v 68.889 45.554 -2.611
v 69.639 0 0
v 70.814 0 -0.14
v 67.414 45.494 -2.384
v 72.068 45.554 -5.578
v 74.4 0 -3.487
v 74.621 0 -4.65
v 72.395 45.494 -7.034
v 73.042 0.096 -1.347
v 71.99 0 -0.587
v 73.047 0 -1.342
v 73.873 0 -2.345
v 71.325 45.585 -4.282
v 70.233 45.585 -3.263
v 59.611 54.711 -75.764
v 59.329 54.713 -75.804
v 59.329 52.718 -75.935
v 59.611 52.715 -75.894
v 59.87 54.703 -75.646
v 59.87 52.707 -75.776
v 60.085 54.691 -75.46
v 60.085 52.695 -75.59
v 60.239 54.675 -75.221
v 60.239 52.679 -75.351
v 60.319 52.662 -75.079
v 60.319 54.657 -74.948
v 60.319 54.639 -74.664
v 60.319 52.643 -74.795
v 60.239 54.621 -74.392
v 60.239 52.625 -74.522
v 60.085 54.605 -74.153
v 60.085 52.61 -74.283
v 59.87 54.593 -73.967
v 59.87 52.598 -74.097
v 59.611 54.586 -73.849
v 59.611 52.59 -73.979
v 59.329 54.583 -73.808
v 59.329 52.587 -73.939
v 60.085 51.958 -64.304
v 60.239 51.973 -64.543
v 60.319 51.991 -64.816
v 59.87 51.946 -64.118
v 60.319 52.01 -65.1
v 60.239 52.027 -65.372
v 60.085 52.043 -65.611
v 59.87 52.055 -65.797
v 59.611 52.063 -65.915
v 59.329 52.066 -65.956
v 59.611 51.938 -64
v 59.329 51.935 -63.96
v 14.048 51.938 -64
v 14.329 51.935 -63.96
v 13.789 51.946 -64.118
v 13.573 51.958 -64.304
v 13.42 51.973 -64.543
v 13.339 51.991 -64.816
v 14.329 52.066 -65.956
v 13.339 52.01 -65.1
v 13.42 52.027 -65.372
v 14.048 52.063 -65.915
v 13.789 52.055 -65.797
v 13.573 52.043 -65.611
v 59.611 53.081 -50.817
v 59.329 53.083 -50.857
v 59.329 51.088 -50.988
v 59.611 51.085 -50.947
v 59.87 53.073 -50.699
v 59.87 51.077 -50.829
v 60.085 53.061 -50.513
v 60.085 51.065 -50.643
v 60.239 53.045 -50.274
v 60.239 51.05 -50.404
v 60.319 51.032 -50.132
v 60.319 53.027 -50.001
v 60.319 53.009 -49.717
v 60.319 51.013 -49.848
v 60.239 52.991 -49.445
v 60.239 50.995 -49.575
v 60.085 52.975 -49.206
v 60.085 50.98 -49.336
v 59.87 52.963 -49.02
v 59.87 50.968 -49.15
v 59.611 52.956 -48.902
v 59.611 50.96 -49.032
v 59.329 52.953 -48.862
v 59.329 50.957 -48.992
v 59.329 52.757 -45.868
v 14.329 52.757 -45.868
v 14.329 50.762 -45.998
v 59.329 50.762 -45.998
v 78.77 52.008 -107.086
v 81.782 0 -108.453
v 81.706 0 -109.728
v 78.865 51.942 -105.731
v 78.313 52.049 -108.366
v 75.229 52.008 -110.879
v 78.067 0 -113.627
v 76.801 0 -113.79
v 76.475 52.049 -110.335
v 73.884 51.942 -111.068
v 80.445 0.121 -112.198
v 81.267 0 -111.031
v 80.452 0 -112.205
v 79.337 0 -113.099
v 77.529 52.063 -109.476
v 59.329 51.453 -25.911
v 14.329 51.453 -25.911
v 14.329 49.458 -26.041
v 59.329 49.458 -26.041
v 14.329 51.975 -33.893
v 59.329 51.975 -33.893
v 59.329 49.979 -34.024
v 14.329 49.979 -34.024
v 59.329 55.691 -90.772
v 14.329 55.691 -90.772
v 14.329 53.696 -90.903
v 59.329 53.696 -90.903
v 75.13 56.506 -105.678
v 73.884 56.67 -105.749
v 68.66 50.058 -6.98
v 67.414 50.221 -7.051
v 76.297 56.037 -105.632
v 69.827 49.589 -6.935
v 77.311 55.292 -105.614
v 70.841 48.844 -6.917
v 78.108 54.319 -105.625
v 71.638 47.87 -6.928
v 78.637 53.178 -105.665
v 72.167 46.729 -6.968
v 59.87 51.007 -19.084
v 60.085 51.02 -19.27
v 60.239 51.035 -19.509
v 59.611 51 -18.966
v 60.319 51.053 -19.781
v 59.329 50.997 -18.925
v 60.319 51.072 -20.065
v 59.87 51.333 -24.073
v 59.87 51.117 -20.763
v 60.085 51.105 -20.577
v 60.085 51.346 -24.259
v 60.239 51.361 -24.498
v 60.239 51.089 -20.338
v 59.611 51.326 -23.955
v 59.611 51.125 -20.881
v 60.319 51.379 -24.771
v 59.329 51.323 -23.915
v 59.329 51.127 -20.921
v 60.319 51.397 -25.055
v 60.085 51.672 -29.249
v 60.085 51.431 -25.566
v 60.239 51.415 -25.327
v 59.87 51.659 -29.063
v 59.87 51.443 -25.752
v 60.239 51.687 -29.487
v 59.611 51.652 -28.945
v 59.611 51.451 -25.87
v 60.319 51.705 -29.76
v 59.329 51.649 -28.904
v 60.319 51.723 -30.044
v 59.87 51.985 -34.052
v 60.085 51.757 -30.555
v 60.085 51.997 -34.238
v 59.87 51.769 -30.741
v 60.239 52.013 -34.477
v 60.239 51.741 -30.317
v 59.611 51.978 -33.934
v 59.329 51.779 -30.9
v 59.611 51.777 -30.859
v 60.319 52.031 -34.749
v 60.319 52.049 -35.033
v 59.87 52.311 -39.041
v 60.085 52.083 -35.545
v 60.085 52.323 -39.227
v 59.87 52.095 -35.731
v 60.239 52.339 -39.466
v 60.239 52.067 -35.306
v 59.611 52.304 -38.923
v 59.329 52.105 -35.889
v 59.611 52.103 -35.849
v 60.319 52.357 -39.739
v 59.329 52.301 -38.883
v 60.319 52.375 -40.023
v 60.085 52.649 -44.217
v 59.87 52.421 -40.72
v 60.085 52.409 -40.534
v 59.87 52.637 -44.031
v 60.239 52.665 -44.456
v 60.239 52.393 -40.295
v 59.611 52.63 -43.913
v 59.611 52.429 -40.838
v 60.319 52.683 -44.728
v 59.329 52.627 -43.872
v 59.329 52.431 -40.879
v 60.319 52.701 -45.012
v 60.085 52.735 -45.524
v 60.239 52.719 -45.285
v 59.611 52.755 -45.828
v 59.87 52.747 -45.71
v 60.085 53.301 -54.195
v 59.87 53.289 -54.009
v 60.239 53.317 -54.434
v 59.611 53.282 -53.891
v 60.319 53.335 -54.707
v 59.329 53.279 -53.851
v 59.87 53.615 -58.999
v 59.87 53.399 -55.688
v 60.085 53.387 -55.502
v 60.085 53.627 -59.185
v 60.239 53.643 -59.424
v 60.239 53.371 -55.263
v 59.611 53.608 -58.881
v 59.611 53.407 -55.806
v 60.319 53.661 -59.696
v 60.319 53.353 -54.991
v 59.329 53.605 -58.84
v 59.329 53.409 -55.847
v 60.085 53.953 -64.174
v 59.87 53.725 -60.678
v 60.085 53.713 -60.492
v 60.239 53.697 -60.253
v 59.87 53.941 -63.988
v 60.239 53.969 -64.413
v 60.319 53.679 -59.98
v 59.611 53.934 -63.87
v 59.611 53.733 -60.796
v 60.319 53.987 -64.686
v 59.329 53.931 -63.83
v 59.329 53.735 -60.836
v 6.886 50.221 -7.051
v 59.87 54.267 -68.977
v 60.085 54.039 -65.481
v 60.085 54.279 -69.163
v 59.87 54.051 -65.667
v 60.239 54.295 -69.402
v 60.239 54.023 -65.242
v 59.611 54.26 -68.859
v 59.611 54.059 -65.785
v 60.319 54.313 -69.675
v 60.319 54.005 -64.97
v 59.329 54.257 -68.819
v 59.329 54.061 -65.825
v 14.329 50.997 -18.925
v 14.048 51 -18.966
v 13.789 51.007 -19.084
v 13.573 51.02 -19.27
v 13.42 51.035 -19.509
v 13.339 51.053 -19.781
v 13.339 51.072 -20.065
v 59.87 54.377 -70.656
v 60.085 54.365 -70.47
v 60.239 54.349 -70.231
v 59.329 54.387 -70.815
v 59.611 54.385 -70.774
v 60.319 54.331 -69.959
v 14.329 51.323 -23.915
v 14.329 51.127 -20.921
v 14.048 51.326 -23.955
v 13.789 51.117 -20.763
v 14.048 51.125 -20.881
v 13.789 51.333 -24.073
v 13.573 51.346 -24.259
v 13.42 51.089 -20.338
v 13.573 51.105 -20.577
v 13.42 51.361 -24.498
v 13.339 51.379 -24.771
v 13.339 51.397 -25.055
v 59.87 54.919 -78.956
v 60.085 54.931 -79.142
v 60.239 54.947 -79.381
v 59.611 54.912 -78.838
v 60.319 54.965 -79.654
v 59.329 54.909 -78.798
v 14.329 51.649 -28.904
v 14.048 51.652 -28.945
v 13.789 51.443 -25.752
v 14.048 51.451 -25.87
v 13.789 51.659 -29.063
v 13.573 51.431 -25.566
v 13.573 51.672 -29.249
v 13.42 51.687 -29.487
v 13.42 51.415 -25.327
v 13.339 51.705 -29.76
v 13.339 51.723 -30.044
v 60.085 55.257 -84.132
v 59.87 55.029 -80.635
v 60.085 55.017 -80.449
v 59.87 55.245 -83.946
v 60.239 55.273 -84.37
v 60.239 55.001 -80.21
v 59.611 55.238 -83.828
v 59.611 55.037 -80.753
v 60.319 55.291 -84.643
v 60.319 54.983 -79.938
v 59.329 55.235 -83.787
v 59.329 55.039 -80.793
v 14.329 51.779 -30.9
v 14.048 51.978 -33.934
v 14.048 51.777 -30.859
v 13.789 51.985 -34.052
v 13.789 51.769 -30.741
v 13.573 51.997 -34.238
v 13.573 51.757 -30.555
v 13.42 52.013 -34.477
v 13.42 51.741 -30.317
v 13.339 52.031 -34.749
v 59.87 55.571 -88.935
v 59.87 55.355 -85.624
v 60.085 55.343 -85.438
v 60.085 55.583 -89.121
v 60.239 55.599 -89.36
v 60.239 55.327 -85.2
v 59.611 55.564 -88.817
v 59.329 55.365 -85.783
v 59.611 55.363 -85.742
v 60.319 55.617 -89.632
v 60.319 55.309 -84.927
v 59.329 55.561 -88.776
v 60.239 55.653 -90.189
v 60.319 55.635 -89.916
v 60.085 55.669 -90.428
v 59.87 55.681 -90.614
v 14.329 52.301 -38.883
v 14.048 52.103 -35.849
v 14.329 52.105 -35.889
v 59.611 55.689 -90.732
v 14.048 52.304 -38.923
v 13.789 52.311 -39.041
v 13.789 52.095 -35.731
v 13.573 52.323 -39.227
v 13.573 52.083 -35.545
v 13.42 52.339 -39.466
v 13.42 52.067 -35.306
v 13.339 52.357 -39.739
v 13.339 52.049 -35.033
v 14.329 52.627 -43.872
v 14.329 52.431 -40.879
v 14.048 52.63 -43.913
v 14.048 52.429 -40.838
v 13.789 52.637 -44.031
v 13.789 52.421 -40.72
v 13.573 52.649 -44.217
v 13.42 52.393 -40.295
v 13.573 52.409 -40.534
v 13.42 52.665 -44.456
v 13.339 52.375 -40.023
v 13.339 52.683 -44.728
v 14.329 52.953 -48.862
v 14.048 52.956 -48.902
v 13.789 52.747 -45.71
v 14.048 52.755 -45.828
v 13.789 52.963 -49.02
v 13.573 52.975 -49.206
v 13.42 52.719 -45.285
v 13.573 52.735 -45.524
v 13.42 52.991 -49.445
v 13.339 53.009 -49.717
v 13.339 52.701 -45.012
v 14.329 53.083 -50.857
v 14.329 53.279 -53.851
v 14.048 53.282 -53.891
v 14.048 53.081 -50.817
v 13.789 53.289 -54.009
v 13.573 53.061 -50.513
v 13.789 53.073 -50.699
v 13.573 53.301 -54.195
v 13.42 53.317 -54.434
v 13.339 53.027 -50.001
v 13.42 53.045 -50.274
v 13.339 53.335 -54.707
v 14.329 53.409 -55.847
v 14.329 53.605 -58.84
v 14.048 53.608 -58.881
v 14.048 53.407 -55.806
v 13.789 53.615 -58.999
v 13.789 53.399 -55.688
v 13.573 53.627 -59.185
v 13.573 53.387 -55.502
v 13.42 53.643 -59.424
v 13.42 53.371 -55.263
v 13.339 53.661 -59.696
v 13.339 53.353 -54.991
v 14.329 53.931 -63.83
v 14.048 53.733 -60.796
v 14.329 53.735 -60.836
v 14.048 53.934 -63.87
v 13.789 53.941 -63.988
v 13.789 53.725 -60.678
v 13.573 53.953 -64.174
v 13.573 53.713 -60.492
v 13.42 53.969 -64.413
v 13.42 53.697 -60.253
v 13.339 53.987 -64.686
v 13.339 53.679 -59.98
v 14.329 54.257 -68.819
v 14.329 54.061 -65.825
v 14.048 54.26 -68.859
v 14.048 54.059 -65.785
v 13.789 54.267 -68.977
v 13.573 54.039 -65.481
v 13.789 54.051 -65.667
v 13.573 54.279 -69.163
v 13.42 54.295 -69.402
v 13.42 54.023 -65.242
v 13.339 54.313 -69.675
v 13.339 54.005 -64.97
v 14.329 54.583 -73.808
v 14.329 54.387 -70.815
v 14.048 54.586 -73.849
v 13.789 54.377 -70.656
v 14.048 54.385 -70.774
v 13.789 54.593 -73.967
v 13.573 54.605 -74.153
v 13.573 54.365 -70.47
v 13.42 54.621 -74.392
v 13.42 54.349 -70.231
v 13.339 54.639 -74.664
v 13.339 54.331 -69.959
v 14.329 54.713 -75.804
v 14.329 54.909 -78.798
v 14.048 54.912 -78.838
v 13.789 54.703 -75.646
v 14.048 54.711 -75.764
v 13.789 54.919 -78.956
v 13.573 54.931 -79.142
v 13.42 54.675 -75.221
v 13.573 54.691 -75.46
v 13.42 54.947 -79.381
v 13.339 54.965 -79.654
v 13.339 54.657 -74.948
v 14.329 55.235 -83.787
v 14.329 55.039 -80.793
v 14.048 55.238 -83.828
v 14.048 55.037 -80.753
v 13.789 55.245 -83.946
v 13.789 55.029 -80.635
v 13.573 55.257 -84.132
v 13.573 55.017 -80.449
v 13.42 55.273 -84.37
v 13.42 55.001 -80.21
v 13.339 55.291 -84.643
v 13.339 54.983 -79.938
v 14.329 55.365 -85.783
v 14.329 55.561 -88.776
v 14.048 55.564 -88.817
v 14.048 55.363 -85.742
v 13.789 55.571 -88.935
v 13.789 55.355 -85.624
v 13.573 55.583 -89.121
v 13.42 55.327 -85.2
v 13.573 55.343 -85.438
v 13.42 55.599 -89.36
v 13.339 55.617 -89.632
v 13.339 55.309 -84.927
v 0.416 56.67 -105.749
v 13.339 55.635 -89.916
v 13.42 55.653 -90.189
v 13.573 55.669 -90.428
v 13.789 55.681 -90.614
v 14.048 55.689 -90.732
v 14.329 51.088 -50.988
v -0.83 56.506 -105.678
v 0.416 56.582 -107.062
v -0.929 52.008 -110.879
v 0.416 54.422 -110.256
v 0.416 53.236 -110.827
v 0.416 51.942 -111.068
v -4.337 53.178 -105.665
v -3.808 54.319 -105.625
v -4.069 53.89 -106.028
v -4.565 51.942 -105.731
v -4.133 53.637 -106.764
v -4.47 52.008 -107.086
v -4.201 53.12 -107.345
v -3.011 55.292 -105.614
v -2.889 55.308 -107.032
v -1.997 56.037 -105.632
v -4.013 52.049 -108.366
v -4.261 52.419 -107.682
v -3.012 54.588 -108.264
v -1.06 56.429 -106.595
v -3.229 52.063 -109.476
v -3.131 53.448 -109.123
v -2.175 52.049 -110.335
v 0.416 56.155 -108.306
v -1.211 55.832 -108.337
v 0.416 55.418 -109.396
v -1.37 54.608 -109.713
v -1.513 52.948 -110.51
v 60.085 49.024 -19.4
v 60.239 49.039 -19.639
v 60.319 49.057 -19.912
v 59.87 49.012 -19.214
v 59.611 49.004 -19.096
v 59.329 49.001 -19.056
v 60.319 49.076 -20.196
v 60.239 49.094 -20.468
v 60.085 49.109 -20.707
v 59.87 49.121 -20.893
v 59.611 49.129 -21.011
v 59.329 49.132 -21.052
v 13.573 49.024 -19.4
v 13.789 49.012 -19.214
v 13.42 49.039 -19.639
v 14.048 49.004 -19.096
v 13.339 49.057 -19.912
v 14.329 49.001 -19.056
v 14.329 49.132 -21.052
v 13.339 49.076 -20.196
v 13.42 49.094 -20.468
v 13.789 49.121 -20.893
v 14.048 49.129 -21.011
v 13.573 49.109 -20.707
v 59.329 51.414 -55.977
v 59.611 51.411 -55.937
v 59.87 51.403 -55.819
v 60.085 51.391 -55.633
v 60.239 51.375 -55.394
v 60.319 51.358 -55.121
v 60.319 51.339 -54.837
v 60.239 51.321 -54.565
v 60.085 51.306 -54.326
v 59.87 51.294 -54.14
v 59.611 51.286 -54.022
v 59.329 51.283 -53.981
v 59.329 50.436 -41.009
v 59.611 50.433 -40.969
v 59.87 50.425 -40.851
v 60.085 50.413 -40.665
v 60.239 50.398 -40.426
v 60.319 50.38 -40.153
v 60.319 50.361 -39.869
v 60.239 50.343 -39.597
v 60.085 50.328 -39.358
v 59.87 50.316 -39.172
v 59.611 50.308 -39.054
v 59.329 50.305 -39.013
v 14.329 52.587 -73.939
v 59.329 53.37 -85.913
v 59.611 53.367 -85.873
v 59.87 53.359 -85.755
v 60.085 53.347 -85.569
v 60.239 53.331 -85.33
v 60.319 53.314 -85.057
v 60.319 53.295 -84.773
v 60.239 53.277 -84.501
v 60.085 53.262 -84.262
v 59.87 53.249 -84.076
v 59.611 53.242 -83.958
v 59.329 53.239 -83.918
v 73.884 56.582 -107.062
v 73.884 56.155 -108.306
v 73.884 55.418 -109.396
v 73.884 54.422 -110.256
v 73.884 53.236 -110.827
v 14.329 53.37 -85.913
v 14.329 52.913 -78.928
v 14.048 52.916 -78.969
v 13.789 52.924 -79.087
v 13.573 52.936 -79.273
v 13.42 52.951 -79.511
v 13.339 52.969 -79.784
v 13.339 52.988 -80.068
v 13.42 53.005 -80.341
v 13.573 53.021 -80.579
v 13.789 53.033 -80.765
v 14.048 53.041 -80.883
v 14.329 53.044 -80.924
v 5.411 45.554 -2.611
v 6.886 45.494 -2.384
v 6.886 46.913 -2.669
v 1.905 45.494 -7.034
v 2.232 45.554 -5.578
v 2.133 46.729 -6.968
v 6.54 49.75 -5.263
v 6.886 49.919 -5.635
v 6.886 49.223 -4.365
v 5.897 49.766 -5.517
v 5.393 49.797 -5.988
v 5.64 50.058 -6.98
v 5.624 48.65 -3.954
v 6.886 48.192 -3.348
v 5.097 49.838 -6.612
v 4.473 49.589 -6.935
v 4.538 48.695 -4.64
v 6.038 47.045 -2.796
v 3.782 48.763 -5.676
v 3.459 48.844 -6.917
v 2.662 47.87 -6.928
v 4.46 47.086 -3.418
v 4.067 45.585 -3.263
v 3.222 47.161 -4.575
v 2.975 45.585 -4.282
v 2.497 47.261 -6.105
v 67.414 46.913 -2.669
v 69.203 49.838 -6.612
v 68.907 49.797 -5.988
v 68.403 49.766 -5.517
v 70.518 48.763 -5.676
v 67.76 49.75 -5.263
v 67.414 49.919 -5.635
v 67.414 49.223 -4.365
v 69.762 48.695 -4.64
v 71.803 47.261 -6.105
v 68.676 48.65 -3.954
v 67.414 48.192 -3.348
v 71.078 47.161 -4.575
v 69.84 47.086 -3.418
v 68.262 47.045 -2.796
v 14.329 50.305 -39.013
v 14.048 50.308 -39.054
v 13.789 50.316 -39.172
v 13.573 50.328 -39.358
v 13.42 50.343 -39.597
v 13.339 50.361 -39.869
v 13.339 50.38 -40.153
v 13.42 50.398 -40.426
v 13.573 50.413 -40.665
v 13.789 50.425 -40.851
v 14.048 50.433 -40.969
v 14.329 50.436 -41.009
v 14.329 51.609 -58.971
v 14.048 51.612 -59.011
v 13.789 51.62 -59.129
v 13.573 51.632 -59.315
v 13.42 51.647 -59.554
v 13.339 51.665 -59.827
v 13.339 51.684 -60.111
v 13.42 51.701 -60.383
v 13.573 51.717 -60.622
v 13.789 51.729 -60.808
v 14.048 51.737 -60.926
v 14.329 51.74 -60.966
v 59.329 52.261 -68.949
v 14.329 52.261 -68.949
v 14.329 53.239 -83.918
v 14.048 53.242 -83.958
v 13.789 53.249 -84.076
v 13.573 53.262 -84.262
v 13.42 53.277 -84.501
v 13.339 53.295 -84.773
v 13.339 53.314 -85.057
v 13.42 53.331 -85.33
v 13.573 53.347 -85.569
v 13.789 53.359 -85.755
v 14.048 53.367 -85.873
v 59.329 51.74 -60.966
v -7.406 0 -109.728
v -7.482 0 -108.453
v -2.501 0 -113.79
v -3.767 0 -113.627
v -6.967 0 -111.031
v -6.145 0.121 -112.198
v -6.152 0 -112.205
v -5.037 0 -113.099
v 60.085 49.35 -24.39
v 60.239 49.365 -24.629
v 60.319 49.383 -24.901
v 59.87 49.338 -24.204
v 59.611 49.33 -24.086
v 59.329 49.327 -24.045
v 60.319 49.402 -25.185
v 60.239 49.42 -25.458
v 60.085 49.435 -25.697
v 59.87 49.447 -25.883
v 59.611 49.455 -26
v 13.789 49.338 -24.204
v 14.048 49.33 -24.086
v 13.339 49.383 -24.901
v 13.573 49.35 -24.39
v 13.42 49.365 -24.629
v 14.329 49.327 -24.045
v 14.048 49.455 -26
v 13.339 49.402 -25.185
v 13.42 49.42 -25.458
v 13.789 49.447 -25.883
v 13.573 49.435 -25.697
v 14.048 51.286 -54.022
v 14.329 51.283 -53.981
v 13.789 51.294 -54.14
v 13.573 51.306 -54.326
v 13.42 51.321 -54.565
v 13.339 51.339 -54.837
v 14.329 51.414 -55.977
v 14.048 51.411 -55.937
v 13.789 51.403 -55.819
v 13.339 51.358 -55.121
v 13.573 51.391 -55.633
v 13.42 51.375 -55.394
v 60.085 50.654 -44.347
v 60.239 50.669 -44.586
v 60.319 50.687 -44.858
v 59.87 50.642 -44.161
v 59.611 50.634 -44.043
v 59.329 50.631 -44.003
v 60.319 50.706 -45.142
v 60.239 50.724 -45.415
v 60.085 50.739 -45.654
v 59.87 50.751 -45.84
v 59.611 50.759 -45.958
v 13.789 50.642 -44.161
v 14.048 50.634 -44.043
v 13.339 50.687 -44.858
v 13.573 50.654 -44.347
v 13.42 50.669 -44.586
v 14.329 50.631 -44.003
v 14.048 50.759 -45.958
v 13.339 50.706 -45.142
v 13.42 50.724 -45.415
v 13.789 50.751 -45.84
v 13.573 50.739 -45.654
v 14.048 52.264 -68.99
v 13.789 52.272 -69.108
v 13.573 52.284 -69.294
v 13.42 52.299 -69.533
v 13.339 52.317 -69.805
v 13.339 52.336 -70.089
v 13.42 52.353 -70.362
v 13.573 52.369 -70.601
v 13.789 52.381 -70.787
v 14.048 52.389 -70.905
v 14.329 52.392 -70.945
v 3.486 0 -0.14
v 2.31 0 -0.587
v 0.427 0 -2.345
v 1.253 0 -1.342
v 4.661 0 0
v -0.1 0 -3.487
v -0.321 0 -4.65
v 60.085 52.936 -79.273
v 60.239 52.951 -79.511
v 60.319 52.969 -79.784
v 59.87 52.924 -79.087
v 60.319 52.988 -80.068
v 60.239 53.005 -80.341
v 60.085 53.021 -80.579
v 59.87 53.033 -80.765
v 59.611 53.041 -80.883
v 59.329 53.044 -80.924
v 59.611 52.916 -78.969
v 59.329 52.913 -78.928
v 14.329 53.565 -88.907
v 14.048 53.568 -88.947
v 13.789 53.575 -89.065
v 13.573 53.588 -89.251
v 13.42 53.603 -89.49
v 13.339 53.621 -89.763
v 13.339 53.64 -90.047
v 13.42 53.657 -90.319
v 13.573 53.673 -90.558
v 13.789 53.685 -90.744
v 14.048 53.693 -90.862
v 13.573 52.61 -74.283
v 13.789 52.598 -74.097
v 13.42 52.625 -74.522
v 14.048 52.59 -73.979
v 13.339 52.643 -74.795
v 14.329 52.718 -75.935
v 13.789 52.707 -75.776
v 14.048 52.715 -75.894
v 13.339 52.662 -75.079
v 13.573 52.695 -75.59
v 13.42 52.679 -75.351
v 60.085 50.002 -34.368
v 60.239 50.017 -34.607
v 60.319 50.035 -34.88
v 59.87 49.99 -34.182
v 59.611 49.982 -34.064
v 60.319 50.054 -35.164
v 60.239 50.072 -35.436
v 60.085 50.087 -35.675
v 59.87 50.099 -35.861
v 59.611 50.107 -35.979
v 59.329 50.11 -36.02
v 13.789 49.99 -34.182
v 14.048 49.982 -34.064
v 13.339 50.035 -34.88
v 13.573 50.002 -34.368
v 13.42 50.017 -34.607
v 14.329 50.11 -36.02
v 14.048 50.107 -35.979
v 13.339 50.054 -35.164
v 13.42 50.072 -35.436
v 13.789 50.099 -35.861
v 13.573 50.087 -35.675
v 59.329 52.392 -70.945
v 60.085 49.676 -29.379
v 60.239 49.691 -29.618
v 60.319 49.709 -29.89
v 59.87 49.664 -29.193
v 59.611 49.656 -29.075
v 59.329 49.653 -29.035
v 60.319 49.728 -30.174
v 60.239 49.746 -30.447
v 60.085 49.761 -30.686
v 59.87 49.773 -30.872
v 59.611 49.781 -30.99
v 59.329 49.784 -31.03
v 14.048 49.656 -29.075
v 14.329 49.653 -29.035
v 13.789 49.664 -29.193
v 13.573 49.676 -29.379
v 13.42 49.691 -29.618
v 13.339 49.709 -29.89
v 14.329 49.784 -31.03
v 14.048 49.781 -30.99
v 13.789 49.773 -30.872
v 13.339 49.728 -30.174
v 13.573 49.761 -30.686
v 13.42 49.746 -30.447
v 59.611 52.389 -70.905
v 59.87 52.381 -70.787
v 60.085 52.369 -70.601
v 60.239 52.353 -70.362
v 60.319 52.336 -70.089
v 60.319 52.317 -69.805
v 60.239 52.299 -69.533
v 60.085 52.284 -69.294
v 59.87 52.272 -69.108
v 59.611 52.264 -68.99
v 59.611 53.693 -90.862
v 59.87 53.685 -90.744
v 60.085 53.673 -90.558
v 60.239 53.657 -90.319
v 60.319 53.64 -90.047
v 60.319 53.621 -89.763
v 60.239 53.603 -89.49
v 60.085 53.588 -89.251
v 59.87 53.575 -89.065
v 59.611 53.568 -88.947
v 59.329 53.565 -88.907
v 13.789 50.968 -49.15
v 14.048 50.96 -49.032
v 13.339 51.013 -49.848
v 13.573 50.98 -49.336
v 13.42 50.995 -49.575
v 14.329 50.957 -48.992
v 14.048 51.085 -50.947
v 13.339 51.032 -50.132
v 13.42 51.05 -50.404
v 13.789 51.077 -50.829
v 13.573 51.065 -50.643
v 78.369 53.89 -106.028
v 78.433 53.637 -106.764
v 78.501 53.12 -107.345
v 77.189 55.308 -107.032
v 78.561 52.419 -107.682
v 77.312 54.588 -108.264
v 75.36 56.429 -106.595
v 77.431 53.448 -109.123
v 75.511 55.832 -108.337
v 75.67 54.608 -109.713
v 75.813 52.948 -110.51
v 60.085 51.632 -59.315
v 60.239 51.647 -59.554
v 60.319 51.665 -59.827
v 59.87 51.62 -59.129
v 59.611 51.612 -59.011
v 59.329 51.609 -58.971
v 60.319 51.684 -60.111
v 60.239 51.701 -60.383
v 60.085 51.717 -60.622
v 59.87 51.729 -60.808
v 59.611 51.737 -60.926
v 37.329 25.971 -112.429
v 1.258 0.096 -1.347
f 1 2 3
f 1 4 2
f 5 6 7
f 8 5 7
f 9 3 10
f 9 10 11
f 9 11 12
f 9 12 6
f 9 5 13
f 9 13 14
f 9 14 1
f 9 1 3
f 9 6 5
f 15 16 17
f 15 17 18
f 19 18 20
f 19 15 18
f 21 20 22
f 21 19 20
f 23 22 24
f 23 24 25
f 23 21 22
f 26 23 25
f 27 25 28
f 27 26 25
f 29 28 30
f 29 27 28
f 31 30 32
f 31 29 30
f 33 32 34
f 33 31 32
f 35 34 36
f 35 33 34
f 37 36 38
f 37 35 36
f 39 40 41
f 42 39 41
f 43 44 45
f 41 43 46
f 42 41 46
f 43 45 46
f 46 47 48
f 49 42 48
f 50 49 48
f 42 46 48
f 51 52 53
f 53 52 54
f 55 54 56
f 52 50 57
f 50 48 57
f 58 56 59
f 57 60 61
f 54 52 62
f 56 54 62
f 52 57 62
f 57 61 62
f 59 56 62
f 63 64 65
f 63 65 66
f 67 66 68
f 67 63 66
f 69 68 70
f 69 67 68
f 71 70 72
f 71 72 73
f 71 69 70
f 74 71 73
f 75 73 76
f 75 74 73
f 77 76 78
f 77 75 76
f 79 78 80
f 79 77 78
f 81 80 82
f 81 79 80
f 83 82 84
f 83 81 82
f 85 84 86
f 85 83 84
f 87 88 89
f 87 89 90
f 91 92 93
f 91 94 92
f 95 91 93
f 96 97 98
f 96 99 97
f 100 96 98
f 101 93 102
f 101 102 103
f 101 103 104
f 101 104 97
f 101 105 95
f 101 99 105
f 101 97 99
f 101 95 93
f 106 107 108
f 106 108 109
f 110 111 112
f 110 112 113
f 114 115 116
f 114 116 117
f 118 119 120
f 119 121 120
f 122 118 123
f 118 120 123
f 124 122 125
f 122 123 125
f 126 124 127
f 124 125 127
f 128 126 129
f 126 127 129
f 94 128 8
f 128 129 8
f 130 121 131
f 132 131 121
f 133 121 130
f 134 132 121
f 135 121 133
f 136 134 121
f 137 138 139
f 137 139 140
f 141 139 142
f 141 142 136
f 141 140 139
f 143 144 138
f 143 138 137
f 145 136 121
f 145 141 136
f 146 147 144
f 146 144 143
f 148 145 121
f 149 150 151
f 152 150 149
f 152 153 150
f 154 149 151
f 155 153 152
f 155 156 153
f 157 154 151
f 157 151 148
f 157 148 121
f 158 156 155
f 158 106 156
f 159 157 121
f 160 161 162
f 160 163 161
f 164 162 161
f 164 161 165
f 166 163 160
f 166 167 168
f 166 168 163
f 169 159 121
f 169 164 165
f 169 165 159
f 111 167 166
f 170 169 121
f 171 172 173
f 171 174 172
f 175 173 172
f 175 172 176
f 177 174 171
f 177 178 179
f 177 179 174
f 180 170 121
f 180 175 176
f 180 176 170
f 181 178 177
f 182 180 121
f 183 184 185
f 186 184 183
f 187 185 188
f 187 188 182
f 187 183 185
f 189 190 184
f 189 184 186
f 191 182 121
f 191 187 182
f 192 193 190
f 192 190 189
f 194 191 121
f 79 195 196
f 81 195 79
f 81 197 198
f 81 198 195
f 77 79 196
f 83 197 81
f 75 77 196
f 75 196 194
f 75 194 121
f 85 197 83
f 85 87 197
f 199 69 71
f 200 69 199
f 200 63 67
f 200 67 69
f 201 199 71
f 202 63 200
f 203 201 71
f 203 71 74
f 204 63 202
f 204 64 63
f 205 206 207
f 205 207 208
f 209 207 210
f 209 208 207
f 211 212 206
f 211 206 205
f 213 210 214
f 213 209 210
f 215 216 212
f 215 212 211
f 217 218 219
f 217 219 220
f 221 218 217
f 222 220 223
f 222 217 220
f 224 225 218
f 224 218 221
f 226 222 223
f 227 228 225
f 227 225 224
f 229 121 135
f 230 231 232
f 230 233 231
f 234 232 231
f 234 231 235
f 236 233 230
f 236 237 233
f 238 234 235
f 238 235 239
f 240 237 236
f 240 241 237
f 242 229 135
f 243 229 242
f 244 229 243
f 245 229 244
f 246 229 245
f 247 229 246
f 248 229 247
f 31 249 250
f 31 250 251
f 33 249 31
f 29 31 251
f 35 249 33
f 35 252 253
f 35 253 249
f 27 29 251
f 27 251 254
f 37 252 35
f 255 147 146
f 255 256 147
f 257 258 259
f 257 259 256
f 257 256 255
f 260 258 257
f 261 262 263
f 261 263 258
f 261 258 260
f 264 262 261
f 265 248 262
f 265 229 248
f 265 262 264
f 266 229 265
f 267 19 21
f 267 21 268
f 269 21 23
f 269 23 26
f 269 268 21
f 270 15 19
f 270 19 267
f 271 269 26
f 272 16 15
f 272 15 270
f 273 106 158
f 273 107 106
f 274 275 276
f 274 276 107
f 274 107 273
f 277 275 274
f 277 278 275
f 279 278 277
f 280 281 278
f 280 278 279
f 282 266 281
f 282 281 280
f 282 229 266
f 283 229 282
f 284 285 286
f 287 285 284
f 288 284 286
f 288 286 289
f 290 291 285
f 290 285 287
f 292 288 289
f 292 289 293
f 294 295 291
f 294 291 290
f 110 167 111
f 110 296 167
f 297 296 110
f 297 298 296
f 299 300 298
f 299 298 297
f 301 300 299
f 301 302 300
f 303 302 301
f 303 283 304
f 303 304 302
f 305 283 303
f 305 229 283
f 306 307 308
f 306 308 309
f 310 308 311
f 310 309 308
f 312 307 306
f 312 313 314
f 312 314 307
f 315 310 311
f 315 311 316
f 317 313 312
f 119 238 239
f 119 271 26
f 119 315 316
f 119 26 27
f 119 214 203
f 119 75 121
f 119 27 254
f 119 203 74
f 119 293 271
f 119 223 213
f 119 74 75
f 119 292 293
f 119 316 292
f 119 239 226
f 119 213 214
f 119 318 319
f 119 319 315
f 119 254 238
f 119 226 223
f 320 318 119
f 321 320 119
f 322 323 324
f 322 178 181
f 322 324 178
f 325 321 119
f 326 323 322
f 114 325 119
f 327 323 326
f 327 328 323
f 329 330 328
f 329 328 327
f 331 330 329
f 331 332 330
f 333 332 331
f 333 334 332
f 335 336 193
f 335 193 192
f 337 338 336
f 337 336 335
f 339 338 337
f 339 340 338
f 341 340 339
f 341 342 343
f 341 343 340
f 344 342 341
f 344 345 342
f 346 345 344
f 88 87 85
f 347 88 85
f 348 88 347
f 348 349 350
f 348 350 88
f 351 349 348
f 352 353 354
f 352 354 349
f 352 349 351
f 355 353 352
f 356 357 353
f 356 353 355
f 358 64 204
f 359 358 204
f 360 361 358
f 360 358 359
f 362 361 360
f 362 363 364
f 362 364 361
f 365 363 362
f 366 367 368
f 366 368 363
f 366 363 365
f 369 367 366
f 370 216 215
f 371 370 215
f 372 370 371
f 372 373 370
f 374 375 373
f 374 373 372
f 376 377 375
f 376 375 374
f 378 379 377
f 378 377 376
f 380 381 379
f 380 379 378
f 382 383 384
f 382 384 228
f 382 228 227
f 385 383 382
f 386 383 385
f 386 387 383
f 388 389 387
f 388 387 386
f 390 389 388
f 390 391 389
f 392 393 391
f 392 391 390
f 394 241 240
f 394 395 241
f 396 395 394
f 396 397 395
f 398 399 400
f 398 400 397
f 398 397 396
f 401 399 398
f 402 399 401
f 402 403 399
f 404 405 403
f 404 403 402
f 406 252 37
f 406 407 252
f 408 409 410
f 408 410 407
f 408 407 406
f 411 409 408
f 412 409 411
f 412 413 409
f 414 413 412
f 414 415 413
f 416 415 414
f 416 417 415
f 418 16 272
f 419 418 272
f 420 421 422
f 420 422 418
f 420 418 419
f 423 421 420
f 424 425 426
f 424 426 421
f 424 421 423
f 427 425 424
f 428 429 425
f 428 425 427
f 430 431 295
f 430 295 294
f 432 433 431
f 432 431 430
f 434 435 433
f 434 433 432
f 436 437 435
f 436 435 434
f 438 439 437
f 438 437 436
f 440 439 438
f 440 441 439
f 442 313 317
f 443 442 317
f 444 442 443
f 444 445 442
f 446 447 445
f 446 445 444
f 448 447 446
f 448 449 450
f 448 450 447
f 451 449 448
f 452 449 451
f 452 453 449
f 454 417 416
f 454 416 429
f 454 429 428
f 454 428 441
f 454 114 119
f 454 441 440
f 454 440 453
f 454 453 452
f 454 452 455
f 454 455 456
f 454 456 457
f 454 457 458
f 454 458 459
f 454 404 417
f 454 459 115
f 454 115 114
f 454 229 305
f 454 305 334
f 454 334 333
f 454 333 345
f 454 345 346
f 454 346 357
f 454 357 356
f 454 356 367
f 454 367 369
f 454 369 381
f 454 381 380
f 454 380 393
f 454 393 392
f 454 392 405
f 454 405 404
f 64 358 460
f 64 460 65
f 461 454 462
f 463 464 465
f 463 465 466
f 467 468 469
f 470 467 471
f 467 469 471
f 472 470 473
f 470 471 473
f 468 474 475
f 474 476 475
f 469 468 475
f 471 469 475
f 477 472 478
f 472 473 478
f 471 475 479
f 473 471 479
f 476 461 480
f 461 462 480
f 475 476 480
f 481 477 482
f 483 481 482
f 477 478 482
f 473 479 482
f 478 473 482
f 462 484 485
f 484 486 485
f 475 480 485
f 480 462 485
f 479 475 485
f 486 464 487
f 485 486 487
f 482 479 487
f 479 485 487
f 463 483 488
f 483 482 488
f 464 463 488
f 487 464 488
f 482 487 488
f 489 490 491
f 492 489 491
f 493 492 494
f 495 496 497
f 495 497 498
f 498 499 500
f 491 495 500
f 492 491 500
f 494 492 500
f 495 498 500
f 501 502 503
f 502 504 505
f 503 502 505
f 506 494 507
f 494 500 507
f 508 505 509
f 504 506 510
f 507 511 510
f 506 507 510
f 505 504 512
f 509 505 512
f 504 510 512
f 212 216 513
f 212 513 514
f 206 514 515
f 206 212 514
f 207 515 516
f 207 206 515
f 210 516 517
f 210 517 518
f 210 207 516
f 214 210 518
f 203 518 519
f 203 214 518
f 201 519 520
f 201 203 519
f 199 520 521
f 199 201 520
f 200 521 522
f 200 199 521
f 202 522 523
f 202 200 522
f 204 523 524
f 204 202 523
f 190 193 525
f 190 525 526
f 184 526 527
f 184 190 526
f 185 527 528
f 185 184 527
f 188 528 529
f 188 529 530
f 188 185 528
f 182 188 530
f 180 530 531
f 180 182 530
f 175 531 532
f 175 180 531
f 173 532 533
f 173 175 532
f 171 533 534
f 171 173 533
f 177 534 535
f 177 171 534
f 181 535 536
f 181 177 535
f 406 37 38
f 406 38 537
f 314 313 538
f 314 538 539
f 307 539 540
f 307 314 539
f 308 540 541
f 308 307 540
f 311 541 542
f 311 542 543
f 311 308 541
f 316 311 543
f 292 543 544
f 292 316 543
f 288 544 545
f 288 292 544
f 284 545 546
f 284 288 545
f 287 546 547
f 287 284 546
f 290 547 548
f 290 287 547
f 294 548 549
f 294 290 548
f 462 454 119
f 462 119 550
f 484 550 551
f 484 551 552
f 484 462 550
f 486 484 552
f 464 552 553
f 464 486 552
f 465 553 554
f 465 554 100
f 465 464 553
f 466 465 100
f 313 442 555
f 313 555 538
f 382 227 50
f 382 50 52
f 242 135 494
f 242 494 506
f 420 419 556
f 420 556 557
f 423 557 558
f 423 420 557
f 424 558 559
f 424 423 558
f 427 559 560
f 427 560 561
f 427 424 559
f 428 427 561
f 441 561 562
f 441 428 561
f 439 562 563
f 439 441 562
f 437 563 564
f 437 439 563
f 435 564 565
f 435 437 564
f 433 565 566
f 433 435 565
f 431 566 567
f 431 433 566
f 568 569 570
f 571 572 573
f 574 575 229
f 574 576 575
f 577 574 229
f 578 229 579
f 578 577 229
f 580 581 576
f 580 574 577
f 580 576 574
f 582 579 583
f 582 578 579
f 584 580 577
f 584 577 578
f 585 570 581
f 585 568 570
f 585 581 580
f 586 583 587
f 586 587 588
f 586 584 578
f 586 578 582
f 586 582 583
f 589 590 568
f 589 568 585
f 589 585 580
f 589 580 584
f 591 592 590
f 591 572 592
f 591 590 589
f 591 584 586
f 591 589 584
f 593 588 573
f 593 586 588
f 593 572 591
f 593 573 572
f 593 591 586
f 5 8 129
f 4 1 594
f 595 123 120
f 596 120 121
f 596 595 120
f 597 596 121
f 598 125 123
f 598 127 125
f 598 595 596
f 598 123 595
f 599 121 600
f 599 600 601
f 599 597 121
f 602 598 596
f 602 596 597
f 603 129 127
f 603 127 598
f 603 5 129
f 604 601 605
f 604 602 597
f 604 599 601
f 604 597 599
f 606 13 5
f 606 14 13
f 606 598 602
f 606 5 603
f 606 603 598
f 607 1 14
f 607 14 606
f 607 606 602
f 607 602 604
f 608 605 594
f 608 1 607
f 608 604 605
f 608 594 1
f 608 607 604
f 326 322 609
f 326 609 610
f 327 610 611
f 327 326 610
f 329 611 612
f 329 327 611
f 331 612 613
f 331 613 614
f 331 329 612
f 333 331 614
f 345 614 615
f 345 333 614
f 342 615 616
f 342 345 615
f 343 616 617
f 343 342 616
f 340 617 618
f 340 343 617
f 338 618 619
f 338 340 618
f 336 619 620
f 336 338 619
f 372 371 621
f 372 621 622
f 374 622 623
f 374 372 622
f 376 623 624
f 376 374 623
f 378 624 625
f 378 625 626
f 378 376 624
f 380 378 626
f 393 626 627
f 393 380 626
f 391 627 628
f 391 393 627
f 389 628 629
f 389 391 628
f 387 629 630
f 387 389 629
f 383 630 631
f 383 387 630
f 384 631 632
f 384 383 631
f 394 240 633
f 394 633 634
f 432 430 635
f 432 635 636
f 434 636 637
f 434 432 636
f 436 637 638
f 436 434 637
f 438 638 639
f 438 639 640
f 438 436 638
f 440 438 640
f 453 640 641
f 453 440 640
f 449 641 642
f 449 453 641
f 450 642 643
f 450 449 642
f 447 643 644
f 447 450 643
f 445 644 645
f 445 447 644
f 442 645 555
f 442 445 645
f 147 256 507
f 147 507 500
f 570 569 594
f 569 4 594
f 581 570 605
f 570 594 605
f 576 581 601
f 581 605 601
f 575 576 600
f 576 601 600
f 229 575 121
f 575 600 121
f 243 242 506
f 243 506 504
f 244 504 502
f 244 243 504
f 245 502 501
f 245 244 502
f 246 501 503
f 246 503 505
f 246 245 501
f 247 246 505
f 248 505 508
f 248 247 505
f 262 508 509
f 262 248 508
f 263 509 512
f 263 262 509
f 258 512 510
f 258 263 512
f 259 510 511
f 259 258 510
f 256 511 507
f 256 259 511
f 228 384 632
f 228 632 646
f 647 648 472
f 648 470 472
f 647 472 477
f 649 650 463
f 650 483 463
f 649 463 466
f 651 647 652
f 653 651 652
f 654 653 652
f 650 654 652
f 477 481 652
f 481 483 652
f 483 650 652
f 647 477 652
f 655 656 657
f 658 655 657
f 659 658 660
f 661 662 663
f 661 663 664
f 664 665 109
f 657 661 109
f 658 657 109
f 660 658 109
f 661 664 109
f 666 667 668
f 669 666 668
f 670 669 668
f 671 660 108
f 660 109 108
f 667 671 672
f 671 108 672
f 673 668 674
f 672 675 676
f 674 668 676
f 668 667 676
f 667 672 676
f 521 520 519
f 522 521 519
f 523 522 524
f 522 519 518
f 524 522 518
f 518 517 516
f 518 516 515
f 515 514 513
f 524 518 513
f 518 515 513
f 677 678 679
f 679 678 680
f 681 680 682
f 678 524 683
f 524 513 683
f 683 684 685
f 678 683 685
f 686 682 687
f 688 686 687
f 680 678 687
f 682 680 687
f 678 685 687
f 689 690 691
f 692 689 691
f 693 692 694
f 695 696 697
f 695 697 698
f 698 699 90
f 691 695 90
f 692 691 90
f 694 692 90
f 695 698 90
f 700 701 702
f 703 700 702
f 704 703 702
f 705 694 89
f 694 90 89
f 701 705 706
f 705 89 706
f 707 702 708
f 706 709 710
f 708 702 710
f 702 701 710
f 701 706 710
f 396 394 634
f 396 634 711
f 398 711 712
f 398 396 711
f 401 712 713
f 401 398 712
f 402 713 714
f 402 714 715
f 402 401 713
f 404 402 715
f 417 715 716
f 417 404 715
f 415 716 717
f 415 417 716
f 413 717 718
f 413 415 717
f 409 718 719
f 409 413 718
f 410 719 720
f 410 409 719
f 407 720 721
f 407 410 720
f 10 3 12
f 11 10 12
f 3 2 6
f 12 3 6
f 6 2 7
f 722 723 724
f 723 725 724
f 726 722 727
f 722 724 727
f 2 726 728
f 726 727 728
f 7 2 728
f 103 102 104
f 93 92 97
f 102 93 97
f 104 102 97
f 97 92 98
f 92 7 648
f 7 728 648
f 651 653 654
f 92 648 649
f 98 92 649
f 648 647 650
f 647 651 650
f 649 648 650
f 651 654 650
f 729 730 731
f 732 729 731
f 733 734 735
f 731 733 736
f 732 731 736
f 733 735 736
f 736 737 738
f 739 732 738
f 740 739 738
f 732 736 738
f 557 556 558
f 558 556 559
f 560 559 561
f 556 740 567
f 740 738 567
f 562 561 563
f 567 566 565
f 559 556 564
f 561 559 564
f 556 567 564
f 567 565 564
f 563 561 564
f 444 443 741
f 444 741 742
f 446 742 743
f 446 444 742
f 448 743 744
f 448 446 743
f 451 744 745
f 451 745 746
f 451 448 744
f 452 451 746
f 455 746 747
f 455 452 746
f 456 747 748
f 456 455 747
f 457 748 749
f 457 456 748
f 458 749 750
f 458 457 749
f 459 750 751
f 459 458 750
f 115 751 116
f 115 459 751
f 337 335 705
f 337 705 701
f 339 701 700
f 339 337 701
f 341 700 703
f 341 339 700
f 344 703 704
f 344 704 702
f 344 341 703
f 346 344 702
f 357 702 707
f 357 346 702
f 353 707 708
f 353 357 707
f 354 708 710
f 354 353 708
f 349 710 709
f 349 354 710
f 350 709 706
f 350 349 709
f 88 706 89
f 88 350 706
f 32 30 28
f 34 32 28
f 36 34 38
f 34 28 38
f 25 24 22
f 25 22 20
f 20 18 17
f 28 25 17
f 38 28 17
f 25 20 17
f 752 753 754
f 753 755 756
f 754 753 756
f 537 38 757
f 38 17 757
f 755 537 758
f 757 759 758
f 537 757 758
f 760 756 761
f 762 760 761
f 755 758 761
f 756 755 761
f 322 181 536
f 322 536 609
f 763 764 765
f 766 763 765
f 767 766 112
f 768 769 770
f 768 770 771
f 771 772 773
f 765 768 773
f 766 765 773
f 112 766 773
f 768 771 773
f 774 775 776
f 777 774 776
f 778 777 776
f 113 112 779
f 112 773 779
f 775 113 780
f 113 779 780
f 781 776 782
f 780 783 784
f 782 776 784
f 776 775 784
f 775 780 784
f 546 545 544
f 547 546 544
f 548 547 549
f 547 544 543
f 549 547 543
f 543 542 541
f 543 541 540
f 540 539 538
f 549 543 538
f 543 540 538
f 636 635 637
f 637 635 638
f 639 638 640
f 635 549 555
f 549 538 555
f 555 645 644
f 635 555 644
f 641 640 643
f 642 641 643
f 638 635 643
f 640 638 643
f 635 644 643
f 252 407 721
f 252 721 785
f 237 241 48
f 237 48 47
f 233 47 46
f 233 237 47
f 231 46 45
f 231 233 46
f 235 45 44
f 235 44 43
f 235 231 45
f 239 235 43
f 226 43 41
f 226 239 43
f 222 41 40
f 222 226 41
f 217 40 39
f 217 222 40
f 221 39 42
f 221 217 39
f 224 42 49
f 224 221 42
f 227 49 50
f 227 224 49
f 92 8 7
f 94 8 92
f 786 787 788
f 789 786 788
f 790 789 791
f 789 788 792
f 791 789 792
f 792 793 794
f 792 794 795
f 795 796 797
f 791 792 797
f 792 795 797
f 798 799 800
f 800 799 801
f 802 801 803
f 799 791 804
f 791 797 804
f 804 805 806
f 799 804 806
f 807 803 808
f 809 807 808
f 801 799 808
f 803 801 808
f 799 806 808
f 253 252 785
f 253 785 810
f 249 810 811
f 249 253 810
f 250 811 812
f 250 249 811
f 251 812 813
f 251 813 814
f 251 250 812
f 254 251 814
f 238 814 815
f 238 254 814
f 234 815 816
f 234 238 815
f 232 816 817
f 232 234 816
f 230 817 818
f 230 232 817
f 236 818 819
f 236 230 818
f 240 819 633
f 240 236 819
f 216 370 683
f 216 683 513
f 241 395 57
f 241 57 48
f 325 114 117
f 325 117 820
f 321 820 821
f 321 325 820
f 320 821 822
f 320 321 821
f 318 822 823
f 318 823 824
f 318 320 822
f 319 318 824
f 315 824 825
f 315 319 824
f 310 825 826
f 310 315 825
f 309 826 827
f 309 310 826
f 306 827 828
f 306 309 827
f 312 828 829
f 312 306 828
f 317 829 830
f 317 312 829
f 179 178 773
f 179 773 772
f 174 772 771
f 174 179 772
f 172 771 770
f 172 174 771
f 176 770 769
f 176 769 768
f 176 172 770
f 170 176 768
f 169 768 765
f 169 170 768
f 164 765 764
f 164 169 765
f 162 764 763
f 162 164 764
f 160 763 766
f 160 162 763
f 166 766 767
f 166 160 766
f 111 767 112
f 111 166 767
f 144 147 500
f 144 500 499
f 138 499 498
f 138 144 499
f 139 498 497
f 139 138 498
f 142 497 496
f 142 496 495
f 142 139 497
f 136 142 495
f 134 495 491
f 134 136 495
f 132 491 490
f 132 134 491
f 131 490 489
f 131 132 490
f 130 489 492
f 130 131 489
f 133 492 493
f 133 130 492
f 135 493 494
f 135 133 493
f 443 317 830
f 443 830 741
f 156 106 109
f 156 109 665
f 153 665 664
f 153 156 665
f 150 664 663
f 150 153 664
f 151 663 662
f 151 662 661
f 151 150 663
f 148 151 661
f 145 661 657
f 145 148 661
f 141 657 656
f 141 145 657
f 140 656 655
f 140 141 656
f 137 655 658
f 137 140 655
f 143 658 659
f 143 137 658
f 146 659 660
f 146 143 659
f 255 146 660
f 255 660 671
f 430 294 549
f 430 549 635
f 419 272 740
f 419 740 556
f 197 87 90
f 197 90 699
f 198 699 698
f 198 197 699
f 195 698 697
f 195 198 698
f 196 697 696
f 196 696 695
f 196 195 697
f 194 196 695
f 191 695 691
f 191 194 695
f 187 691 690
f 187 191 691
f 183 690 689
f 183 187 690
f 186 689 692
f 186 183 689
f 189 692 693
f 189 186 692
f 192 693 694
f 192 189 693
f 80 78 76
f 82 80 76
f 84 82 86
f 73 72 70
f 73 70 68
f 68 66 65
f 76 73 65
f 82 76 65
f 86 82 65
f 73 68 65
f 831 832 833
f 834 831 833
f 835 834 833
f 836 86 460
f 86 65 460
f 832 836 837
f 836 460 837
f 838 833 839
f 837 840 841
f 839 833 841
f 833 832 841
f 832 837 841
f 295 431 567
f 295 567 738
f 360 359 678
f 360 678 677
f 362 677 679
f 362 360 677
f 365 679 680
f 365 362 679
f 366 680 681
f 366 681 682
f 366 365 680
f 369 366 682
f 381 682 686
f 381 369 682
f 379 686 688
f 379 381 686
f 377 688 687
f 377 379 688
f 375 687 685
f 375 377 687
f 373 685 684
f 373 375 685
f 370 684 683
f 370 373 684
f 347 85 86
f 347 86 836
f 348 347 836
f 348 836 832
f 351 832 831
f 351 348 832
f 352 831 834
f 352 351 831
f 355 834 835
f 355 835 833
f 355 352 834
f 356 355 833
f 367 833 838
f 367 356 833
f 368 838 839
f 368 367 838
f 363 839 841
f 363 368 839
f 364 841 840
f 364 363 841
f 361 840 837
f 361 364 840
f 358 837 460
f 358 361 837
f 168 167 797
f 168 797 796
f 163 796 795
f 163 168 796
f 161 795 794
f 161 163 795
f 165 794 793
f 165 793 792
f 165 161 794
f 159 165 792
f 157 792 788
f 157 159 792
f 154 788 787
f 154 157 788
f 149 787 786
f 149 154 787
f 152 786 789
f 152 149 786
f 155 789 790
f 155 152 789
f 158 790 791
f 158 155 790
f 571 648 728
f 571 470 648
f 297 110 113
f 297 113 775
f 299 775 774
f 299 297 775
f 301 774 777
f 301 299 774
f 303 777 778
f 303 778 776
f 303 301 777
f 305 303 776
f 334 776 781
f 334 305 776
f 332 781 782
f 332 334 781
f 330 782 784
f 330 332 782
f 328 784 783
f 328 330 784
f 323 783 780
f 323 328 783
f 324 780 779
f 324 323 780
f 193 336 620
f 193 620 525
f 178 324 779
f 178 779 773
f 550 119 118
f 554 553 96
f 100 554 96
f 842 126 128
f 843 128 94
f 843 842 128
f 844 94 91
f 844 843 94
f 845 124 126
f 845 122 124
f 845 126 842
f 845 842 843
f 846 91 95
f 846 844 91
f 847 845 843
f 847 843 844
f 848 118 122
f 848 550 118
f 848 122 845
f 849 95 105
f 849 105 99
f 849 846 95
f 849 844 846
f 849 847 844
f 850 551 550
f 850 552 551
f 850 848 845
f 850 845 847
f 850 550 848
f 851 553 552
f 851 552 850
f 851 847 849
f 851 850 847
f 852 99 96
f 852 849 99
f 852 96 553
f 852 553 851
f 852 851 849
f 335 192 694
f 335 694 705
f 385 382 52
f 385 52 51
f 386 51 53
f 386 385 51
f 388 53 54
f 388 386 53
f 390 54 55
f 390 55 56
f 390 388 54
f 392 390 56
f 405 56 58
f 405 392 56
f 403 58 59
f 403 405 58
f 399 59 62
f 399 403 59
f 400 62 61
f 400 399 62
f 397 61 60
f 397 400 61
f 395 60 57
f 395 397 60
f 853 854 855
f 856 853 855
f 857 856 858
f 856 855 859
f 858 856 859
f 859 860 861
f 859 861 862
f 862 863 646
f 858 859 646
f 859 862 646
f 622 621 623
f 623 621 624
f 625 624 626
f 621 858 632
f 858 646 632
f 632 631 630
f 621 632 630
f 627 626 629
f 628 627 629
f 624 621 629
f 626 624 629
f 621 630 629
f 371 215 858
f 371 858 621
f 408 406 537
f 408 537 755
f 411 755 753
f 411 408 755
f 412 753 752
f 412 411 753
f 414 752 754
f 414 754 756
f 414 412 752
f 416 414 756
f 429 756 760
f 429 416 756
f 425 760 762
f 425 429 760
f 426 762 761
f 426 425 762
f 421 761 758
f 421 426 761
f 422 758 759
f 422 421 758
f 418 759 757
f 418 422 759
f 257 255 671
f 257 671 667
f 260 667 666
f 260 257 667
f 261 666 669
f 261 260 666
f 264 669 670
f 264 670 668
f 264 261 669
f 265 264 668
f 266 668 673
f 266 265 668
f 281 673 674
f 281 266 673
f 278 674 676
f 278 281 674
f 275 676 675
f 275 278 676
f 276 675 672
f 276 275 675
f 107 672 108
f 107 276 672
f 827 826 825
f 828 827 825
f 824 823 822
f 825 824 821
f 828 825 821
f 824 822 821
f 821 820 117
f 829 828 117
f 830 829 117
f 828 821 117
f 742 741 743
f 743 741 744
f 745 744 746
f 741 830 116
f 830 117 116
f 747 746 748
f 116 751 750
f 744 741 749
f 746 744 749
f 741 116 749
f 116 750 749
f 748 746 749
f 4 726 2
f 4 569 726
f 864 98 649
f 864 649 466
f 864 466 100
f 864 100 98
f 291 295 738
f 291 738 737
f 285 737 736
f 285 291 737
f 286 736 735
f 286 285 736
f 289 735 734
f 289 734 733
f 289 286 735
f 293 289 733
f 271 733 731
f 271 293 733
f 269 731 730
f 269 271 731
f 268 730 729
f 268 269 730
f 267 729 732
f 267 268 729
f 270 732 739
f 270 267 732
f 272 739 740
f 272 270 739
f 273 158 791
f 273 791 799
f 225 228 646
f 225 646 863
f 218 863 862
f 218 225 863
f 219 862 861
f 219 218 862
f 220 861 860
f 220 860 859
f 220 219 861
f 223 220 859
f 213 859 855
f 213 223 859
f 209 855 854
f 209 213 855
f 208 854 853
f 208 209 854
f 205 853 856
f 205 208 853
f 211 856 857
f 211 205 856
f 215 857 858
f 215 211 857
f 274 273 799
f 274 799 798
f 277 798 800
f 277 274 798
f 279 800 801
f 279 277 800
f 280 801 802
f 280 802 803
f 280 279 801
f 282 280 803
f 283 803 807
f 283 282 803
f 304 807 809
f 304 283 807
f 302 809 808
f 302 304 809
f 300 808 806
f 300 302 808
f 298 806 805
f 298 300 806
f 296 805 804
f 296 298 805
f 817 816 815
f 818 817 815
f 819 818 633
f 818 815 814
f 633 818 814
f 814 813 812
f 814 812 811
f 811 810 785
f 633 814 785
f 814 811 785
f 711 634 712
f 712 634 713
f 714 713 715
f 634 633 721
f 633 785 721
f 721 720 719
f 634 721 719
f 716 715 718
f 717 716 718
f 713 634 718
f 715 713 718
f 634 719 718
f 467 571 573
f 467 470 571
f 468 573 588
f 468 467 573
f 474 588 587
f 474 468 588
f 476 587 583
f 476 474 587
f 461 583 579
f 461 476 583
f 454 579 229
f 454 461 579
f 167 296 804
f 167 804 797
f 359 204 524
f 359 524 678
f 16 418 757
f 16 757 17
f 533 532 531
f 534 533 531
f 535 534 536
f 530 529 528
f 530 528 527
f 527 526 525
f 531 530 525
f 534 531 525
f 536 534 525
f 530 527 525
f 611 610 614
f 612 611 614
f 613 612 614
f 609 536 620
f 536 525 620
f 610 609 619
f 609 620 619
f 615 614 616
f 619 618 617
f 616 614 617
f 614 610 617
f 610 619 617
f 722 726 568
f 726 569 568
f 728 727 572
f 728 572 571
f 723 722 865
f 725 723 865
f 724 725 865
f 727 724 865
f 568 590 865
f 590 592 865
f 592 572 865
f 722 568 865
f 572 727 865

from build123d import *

# Parameters (mm, degrees)
BOSS_EXTRUDE1_DEPTH = 57
BOSS_EXTRUDE1_TAPER = 3
CUT_EXTRUDE5_DEPTH  = 91.003752482
FILLET1_R           = 5
CUT_EXTRUDE6_DEPTH  = 2


with BuildPart() as part:
    # Sketch1 → Boss-Extrude1 (new body)
    with BuildSketch(Plane(origin=(0, 0, 0), x_dir=(1, 0, 0), z_dir=(0, 1, 0))):
        Polygon((0, 0), (74.3, 0), (82.15, 113.789940148), (-7.85, 113.789940148), align=None)
    extrude(amount=BOSS_EXTRUDE1_DEPTH, taper=BOSS_EXTRUDE1_TAPER)

    # Sketch3 → Cut-Extrude5 (cut, through all, along a direction that is not the sketch's normal)
    with BuildSketch(Plane(origin=(0, 0, 0), x_dir=(0.068634232, -0.003605517, 0.997635375), z_dir=(-0.996261657, 0.052335956, 0.06872887))):
        Polygon((-111.065324518, 56.677595682), (-2.994323871, 57.067784774), (-2.623000223, 49.990855578), align=None)
    extrude(amount=-CUT_EXTRUDE5_DEPTH, dir=(-1, 0, 0), mode=Mode.SUBTRACT)

    # Fillet1
    fillet1_edges = [part.edges().sort_by_distance(p)[0] for p in [
        (37.15, 57, -110.802696729),
        (1.22124645, 24.965738369, -1.308398906),
        (73.07875355, 24.965738369, -1.308398906),
        (75.403541725, 53.465738369, -56.709747271),
        (37.15, 49.931476738, -2.616797812),
        (-1.103541725, 53.465738369, -56.709747271),
        (-6.249788175, 28.5, -112.296318439),
        (80.549788175, 28.5, -112.296318439),
    ]]
    fillet(fillet1_edges, radius=FILLET1_R)

    # Sketch4 → Cut-Extrude6 (cut)
    with BuildSketch(Plane(origin=(0, 49.548983776, 3.237373336), x_dir=(1, 0, 0), z_dir=(0, 0.997872359, 0.065197813))):
        with BuildLine():
            Line((14.329245801, 94.210038911), (59.329245801, 94.210038911))
            ThreePointArc((59.329245801, 94.210038911), (60.329245801, 93.210038911), (59.329245801, 92.210038911))
            Line((59.329245801, 92.210038911), (14.329245801, 92.210038911))
            ThreePointArc((14.329245801, 92.210038911), (13.329245801, 93.210038911), (14.329245801, 94.210038911))
        make_face()
        with BuildLine():
            Line((14.329245801, 89.210038911), (59.329245801, 89.210038911))
            ThreePointArc((59.329245801, 89.210038911), (60.329245801, 88.210038911), (59.329245801, 87.210038911))
            Line((59.329245801, 87.210038911), (14.329245801, 87.210038911))
            ThreePointArc((14.329245801, 87.210038911), (13.329245801, 88.210038911), (14.329245801, 89.210038911))
        make_face()
        with BuildLine():
            Line((14.329245801, 84.210038911), (59.329245801, 84.210038911))
            ThreePointArc((59.329245801, 84.210038911), (60.329245801, 83.210038911), (59.329245801, 82.210038911))
            Line((59.329245801, 82.210038911), (14.329245801, 82.210038911))
            ThreePointArc((14.329245801, 82.210038911), (13.329245801, 83.210038911), (14.329245801, 84.210038911))
        make_face()
        with BuildLine():
            Line((14.329245801, 79.210038911), (59.329245801, 79.210038911))
            ThreePointArc((59.329245801, 79.210038911), (60.329245801, 78.210038911), (59.329245801, 77.210038911))
            Line((59.329245801, 77.210038911), (14.329245801, 77.210038911))
            ThreePointArc((14.329245801, 77.210038911), (13.329245801, 78.210038911), (14.329245801, 79.210038911))
        make_face()
        with BuildLine():
            Line((14.329245801, 74.210038911), (59.329245801, 74.210038911))
            ThreePointArc((59.329245801, 74.210038911), (60.329245801, 73.210038911), (59.329245801, 72.210038911))
            Line((59.329245801, 72.210038911), (14.329245801, 72.210038911))
            ThreePointArc((14.329245801, 72.210038911), (13.329245801, 73.210038911), (14.329245801, 74.210038911))
        make_face()
        with BuildLine():
            Line((14.329245801, 69.210038911), (59.329245801, 69.210038911))
            ThreePointArc((59.329245801, 69.210038911), (60.329245801, 68.210038911), (59.329245801, 67.210038911))
            Line((59.329245801, 67.210038911), (14.329245801, 67.210038911))
            ThreePointArc((14.329245801, 67.210038911), (13.329245801, 68.210038911), (14.329245801, 69.210038911))
        make_face()
        with BuildLine():
            Line((14.329245801, 64.210038911), (59.329245801, 64.210038911))
            ThreePointArc((59.329245801, 64.210038911), (60.329245801, 63.210038911), (59.329245801, 62.210038911))
            Line((59.329245801, 62.210038911), (14.329245801, 62.210038911))
            ThreePointArc((14.329245801, 62.210038911), (13.329245801, 63.210038911), (14.329245801, 64.210038911))
        make_face()
        with BuildLine():
            Line((14.329245801, 59.210038911), (59.329245801, 59.210038911))
            ThreePointArc((59.329245801, 59.210038911), (60.329245801, 58.210038911), (59.329245801, 57.210038911))
            Line((59.329245801, 57.210038911), (14.329245801, 57.210038911))
            ThreePointArc((14.329245801, 57.210038911), (13.329245801, 58.210038911), (14.329245801, 59.210038911))
        make_face()
        with BuildLine():
            Line((14.329245801, 54.210038911), (59.329245801, 54.210038911))
            ThreePointArc((59.329245801, 54.210038911), (60.329245801, 53.210038911), (59.329245801, 52.210038911))
            Line((59.329245801, 52.210038911), (14.329245801, 52.210038911))
            ThreePointArc((14.329245801, 52.210038911), (13.329245801, 53.210038911), (14.329245801, 54.210038911))
        make_face()
        with BuildLine():
            Line((14.329245801, 49.210038911), (59.329245801, 49.210038911))
            ThreePointArc((59.329245801, 49.210038911), (60.329245801, 48.210038911), (59.329245801, 47.210038911))
            Line((59.329245801, 47.210038911), (14.329245801, 47.210038911))
            ThreePointArc((14.329245801, 47.210038911), (13.329245801, 48.210038911), (14.329245801, 49.210038911))
        make_face()
        with BuildLine():
            Line((14.329245801, 44.210038911), (59.329245801, 44.210038911))
            ThreePointArc((59.329245801, 44.210038911), (60.329245801, 43.210038911), (59.329245801, 42.210038911))
            Line((59.329245801, 42.210038911), (14.329245801, 42.210038911))
            ThreePointArc((14.329245801, 42.210038911), (13.329245801, 43.210038911), (14.329245801, 44.210038911))
        make_face()
        with BuildLine():
            Line((14.329245801, 39.210038911), (59.329245801, 39.210038911))
            ThreePointArc((59.329245801, 39.210038911), (60.329245801, 38.210038911), (59.329245801, 37.210038911))
            Line((59.329245801, 37.210038911), (14.329245801, 37.210038911))
            ThreePointArc((14.329245801, 37.210038911), (13.329245801, 38.210038911), (14.329245801, 39.210038911))
        make_face()
        with BuildLine():
            Line((14.329245801, 34.210038911), (59.329245801, 34.210038911))
            ThreePointArc((59.329245801, 34.210038911), (60.329245801, 33.210038911), (59.329245801, 32.210038911))
            Line((59.329245801, 32.210038911), (14.329245801, 32.210038911))
            ThreePointArc((14.329245801, 32.210038911), (13.329245801, 33.210038911), (14.329245801, 34.210038911))
        make_face()
        with BuildLine():
            Line((14.329245801, 29.210038911), (59.329245801, 29.210038911))
            ThreePointArc((59.329245801, 29.210038911), (60.329245801, 28.210038911), (59.329245801, 27.210038911))
            Line((59.329245801, 27.210038911), (14.329245801, 27.210038911))
            ThreePointArc((14.329245801, 27.210038911), (13.329245801, 28.210038911), (14.329245801, 29.210038911))
        make_face()
        with BuildLine():
            Line((14.329245801, 24.210038911), (59.329245801, 24.210038911))
            ThreePointArc((59.329245801, 24.210038911), (60.329245801, 23.210038911), (59.329245801, 22.210038911))
            Line((59.329245801, 22.210038911), (14.329245801, 22.210038911))
            ThreePointArc((14.329245801, 22.210038911), (13.329245801, 23.210038911), (14.329245801, 24.210038911))
        make_face()
    extrude(amount=-CUT_EXTRUDE6_DEPTH, mode=Mode.SUBTRACT)


solid = part.part
